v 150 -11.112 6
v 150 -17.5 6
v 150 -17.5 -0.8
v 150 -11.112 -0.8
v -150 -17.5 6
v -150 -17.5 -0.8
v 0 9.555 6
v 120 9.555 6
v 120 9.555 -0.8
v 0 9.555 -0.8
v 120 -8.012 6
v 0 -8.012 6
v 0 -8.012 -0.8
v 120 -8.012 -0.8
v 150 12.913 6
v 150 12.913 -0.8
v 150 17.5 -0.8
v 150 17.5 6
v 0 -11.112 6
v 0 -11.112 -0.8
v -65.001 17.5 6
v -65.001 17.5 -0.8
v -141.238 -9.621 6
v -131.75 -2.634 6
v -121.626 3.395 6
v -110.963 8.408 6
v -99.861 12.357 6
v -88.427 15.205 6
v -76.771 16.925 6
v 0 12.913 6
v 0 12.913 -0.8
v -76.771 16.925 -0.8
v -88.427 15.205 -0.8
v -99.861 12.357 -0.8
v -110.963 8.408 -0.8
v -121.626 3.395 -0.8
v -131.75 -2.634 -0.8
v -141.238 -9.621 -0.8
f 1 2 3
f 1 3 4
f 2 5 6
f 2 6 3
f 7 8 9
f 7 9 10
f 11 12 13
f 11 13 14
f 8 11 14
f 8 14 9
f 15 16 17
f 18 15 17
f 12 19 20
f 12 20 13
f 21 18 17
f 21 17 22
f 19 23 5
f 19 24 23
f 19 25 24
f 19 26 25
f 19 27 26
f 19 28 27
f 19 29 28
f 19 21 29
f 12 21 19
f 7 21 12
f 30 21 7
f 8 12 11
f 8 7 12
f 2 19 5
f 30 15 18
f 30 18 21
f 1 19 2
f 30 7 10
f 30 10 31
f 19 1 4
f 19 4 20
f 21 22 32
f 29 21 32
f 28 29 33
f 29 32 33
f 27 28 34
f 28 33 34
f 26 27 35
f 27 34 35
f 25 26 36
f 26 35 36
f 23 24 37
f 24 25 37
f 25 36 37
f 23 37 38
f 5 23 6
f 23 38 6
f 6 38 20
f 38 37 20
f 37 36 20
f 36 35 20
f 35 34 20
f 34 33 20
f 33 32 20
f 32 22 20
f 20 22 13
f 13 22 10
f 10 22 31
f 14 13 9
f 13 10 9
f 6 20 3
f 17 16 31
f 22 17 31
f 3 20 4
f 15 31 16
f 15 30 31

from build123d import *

# Parameters (mm, degrees)
F1_DEPTH    = 6
F2_DEPTH    = 0.8
F3_T1_DEPTH = 431.7925725323
F4_DEPTH    = 30


# Not quite as in the source:
# - a fillet or chamfer that OpenCascade refuses, or shapes differently, is made with other operations: its cross-section is extruded or revolved along the edge and cut away or added


with BuildPart() as f1:
    # F0 (on Top) → F1 (new body)
    with BuildSketch(Plane.XY):
        Polygon((150, 17.5), (-150, 17.5), (-150, -17.5), (150, -17.5), (150, -11.1123658717), (0, -11.1123658717), (0, -8.0123320222), (150, -8.0123320222), (150, 9.5545258373), (0, 9.5545258373), (0, 12.9128964618), (150, 12.9128964618), align=None)
    extrude(amount=F1_DEPTH)

    # F2 (add): faces of the model
    f2_faces = [f1.faces().sort_by_distance(p)[0] for p in [
        (-7.6230433236, -0.1272136786, 0),
        (-7.6230433236, -0.1272136786, 6),
    ]]
    extrude(f2_faces, amount=F2_DEPTH, dir=(0, 0, -1))

    # F3: fillet of radius 120.7106781187 on 1 edges, made by hand

    # F3_s2 → F3_t1 (cut)
    with BuildSketch(Plane.XY.offset(-213.2962862662)):
        with BuildLine():
            ThreePointArc((-65.0014854935, 17.5), (-110.9627394699, 8.4075593911), (-150, -17.5))
            Line((-150, -17.5), (-150, 17.5))
            Line((-150, 17.5), (-65.0014854935, 17.5))
        make_face()
    extrude(amount=F3_T1_DEPTH, mode=Mode.SUBTRACT)

    # F4 (cut): a face of the model
    f4_faces = [f1.faces().sort_by_distance(p)[0] for p in [
        (150, 0.7710969076, 2.6),
    ]]
    extrude(f4_faces, amount=-F4_DEPTH, mode=Mode.SUBTRACT)


solid = f1.part
